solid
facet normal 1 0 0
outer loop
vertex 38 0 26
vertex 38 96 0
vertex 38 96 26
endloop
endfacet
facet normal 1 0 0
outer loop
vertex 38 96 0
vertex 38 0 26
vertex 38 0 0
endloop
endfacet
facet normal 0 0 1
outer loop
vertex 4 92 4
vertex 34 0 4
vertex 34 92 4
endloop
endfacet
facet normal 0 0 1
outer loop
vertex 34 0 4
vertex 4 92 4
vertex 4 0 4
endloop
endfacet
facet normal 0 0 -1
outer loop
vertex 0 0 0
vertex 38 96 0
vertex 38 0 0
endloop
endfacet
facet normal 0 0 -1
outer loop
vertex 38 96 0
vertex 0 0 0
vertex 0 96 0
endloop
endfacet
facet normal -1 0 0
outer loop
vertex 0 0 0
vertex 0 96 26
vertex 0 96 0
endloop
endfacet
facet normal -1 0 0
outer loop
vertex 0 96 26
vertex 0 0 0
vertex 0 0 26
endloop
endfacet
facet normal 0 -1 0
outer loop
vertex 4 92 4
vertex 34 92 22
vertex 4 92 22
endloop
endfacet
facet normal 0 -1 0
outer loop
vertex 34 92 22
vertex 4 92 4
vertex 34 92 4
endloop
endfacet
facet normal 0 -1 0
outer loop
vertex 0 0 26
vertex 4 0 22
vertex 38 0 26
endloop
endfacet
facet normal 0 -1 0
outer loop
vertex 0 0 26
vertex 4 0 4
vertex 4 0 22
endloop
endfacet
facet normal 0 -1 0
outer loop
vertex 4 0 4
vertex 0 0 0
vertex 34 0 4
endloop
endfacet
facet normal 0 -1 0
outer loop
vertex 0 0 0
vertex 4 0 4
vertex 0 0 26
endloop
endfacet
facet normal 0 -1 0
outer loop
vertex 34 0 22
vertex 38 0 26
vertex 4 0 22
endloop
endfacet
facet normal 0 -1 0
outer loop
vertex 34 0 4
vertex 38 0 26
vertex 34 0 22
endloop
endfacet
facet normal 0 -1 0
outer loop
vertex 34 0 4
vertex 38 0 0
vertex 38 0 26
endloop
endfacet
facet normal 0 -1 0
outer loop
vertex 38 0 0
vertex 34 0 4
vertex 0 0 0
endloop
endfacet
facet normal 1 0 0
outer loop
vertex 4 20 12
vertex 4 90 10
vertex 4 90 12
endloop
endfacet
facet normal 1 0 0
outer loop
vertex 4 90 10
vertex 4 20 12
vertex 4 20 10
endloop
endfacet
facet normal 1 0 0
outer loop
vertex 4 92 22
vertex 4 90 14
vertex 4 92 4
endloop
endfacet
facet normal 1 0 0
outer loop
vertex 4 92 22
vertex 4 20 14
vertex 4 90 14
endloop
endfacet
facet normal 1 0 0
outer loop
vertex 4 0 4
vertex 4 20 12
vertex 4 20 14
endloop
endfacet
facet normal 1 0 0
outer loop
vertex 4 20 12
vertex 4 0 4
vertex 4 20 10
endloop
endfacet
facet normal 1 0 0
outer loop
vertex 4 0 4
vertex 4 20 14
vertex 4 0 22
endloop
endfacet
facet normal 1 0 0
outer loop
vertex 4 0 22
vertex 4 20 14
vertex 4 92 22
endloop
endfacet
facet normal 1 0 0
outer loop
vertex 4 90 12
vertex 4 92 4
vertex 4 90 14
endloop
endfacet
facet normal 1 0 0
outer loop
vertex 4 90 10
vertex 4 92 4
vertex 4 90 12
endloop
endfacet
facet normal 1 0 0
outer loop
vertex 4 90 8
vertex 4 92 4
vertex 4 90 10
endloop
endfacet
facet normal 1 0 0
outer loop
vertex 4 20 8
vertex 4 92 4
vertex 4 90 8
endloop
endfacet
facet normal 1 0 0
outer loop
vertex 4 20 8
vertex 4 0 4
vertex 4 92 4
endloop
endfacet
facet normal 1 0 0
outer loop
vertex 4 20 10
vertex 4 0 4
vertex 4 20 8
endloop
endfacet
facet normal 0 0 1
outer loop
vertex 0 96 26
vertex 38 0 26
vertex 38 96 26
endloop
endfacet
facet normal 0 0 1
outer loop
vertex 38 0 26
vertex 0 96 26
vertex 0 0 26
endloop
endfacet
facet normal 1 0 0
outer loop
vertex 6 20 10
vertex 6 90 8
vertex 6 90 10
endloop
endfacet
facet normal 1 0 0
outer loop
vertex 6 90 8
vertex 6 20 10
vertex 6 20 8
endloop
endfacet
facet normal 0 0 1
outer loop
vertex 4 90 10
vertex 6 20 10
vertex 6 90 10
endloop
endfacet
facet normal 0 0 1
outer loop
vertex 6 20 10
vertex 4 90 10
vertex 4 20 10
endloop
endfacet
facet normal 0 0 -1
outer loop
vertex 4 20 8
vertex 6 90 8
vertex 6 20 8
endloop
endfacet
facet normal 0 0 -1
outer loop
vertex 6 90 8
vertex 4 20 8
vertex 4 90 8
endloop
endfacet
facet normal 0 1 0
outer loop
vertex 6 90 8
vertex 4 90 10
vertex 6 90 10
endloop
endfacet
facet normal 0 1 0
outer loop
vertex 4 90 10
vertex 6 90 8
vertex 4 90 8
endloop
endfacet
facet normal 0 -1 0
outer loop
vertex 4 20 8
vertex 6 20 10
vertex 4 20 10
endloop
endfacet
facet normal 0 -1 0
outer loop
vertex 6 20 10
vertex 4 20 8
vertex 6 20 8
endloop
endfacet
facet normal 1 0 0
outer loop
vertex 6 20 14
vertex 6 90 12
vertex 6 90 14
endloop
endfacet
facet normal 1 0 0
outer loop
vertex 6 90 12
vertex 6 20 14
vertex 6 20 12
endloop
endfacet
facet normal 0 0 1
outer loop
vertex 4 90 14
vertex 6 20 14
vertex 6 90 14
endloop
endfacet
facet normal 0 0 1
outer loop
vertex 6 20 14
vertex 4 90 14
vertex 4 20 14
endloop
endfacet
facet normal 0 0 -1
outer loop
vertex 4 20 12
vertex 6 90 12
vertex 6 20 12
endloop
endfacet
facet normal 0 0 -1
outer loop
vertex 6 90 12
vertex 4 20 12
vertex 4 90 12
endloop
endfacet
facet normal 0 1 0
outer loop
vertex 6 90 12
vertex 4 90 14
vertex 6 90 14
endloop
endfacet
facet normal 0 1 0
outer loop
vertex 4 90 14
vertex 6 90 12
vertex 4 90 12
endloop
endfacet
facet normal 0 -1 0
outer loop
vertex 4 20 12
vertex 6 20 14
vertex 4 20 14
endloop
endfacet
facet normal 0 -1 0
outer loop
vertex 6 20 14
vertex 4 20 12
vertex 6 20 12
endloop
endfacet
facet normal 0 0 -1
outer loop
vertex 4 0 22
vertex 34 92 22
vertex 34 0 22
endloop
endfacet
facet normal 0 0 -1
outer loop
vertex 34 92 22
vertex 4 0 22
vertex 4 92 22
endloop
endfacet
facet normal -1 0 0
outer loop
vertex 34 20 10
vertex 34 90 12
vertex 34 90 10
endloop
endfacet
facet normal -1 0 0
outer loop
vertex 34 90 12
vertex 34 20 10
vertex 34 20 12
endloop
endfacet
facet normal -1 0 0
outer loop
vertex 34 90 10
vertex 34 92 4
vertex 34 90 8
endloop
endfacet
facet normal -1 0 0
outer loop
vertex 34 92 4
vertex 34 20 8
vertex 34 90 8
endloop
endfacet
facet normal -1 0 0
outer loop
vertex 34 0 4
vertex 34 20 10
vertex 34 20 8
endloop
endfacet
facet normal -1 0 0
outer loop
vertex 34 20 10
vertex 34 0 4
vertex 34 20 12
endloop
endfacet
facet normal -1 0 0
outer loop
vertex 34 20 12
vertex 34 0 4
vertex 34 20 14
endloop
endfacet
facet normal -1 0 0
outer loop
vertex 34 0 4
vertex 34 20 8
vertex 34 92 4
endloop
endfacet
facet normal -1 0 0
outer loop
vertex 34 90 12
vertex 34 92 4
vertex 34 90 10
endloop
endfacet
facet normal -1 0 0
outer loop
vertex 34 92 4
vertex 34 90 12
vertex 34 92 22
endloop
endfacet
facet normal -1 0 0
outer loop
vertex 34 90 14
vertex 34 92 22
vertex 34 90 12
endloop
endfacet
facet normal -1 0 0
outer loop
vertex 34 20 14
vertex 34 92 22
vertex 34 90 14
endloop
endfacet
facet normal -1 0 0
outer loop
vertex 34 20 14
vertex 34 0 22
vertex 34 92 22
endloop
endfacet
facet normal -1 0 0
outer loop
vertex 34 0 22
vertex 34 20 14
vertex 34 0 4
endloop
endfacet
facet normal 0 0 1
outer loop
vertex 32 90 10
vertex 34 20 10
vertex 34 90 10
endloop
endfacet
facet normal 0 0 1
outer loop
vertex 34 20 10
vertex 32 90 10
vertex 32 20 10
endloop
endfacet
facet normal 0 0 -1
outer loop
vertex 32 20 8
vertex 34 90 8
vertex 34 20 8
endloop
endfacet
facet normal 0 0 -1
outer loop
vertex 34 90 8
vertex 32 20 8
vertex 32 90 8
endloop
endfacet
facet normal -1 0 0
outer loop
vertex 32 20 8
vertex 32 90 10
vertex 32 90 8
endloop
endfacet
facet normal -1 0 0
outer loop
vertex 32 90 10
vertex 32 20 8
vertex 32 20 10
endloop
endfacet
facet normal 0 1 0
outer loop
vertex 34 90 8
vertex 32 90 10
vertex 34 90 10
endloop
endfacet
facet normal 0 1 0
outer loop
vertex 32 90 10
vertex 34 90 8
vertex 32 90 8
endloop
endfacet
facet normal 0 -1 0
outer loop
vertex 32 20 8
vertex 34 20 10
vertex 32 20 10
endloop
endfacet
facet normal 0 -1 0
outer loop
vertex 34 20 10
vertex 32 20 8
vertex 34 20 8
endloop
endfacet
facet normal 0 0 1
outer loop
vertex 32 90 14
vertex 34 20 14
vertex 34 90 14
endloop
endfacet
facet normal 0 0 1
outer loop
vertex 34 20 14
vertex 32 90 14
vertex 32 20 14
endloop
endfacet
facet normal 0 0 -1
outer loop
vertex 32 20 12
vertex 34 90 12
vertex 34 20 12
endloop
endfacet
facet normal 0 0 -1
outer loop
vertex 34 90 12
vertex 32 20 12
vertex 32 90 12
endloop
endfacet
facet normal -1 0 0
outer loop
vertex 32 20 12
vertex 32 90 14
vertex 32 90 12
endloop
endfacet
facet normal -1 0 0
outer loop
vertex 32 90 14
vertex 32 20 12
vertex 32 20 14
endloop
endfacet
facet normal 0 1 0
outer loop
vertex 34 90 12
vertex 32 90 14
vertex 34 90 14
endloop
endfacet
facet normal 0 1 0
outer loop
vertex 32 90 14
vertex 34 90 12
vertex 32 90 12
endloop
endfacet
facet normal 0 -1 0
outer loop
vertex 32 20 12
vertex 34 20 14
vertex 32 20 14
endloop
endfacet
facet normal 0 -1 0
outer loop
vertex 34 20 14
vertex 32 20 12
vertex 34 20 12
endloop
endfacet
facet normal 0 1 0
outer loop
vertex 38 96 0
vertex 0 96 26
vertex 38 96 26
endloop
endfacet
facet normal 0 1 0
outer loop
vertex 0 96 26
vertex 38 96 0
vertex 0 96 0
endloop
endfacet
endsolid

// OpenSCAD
cube ([38, 92, 4]);
translate ([0,0,4]) cube ([4, 92, 22]);
translate([4,20,8]) cube ([2,70,2]);
translate([4,20,12]) cube ([2,70,2]);
translate ([0,0,22]) cube ([38,92,4]);
translate ([34,0,4]) cube ([4, 92, 20]);
translate([32,20,8]) cube ([2,70,2]);
translate([32,20,12]) cube ([2,70,2]);
translate([0,92,0]) cube ([38,4,26]);
